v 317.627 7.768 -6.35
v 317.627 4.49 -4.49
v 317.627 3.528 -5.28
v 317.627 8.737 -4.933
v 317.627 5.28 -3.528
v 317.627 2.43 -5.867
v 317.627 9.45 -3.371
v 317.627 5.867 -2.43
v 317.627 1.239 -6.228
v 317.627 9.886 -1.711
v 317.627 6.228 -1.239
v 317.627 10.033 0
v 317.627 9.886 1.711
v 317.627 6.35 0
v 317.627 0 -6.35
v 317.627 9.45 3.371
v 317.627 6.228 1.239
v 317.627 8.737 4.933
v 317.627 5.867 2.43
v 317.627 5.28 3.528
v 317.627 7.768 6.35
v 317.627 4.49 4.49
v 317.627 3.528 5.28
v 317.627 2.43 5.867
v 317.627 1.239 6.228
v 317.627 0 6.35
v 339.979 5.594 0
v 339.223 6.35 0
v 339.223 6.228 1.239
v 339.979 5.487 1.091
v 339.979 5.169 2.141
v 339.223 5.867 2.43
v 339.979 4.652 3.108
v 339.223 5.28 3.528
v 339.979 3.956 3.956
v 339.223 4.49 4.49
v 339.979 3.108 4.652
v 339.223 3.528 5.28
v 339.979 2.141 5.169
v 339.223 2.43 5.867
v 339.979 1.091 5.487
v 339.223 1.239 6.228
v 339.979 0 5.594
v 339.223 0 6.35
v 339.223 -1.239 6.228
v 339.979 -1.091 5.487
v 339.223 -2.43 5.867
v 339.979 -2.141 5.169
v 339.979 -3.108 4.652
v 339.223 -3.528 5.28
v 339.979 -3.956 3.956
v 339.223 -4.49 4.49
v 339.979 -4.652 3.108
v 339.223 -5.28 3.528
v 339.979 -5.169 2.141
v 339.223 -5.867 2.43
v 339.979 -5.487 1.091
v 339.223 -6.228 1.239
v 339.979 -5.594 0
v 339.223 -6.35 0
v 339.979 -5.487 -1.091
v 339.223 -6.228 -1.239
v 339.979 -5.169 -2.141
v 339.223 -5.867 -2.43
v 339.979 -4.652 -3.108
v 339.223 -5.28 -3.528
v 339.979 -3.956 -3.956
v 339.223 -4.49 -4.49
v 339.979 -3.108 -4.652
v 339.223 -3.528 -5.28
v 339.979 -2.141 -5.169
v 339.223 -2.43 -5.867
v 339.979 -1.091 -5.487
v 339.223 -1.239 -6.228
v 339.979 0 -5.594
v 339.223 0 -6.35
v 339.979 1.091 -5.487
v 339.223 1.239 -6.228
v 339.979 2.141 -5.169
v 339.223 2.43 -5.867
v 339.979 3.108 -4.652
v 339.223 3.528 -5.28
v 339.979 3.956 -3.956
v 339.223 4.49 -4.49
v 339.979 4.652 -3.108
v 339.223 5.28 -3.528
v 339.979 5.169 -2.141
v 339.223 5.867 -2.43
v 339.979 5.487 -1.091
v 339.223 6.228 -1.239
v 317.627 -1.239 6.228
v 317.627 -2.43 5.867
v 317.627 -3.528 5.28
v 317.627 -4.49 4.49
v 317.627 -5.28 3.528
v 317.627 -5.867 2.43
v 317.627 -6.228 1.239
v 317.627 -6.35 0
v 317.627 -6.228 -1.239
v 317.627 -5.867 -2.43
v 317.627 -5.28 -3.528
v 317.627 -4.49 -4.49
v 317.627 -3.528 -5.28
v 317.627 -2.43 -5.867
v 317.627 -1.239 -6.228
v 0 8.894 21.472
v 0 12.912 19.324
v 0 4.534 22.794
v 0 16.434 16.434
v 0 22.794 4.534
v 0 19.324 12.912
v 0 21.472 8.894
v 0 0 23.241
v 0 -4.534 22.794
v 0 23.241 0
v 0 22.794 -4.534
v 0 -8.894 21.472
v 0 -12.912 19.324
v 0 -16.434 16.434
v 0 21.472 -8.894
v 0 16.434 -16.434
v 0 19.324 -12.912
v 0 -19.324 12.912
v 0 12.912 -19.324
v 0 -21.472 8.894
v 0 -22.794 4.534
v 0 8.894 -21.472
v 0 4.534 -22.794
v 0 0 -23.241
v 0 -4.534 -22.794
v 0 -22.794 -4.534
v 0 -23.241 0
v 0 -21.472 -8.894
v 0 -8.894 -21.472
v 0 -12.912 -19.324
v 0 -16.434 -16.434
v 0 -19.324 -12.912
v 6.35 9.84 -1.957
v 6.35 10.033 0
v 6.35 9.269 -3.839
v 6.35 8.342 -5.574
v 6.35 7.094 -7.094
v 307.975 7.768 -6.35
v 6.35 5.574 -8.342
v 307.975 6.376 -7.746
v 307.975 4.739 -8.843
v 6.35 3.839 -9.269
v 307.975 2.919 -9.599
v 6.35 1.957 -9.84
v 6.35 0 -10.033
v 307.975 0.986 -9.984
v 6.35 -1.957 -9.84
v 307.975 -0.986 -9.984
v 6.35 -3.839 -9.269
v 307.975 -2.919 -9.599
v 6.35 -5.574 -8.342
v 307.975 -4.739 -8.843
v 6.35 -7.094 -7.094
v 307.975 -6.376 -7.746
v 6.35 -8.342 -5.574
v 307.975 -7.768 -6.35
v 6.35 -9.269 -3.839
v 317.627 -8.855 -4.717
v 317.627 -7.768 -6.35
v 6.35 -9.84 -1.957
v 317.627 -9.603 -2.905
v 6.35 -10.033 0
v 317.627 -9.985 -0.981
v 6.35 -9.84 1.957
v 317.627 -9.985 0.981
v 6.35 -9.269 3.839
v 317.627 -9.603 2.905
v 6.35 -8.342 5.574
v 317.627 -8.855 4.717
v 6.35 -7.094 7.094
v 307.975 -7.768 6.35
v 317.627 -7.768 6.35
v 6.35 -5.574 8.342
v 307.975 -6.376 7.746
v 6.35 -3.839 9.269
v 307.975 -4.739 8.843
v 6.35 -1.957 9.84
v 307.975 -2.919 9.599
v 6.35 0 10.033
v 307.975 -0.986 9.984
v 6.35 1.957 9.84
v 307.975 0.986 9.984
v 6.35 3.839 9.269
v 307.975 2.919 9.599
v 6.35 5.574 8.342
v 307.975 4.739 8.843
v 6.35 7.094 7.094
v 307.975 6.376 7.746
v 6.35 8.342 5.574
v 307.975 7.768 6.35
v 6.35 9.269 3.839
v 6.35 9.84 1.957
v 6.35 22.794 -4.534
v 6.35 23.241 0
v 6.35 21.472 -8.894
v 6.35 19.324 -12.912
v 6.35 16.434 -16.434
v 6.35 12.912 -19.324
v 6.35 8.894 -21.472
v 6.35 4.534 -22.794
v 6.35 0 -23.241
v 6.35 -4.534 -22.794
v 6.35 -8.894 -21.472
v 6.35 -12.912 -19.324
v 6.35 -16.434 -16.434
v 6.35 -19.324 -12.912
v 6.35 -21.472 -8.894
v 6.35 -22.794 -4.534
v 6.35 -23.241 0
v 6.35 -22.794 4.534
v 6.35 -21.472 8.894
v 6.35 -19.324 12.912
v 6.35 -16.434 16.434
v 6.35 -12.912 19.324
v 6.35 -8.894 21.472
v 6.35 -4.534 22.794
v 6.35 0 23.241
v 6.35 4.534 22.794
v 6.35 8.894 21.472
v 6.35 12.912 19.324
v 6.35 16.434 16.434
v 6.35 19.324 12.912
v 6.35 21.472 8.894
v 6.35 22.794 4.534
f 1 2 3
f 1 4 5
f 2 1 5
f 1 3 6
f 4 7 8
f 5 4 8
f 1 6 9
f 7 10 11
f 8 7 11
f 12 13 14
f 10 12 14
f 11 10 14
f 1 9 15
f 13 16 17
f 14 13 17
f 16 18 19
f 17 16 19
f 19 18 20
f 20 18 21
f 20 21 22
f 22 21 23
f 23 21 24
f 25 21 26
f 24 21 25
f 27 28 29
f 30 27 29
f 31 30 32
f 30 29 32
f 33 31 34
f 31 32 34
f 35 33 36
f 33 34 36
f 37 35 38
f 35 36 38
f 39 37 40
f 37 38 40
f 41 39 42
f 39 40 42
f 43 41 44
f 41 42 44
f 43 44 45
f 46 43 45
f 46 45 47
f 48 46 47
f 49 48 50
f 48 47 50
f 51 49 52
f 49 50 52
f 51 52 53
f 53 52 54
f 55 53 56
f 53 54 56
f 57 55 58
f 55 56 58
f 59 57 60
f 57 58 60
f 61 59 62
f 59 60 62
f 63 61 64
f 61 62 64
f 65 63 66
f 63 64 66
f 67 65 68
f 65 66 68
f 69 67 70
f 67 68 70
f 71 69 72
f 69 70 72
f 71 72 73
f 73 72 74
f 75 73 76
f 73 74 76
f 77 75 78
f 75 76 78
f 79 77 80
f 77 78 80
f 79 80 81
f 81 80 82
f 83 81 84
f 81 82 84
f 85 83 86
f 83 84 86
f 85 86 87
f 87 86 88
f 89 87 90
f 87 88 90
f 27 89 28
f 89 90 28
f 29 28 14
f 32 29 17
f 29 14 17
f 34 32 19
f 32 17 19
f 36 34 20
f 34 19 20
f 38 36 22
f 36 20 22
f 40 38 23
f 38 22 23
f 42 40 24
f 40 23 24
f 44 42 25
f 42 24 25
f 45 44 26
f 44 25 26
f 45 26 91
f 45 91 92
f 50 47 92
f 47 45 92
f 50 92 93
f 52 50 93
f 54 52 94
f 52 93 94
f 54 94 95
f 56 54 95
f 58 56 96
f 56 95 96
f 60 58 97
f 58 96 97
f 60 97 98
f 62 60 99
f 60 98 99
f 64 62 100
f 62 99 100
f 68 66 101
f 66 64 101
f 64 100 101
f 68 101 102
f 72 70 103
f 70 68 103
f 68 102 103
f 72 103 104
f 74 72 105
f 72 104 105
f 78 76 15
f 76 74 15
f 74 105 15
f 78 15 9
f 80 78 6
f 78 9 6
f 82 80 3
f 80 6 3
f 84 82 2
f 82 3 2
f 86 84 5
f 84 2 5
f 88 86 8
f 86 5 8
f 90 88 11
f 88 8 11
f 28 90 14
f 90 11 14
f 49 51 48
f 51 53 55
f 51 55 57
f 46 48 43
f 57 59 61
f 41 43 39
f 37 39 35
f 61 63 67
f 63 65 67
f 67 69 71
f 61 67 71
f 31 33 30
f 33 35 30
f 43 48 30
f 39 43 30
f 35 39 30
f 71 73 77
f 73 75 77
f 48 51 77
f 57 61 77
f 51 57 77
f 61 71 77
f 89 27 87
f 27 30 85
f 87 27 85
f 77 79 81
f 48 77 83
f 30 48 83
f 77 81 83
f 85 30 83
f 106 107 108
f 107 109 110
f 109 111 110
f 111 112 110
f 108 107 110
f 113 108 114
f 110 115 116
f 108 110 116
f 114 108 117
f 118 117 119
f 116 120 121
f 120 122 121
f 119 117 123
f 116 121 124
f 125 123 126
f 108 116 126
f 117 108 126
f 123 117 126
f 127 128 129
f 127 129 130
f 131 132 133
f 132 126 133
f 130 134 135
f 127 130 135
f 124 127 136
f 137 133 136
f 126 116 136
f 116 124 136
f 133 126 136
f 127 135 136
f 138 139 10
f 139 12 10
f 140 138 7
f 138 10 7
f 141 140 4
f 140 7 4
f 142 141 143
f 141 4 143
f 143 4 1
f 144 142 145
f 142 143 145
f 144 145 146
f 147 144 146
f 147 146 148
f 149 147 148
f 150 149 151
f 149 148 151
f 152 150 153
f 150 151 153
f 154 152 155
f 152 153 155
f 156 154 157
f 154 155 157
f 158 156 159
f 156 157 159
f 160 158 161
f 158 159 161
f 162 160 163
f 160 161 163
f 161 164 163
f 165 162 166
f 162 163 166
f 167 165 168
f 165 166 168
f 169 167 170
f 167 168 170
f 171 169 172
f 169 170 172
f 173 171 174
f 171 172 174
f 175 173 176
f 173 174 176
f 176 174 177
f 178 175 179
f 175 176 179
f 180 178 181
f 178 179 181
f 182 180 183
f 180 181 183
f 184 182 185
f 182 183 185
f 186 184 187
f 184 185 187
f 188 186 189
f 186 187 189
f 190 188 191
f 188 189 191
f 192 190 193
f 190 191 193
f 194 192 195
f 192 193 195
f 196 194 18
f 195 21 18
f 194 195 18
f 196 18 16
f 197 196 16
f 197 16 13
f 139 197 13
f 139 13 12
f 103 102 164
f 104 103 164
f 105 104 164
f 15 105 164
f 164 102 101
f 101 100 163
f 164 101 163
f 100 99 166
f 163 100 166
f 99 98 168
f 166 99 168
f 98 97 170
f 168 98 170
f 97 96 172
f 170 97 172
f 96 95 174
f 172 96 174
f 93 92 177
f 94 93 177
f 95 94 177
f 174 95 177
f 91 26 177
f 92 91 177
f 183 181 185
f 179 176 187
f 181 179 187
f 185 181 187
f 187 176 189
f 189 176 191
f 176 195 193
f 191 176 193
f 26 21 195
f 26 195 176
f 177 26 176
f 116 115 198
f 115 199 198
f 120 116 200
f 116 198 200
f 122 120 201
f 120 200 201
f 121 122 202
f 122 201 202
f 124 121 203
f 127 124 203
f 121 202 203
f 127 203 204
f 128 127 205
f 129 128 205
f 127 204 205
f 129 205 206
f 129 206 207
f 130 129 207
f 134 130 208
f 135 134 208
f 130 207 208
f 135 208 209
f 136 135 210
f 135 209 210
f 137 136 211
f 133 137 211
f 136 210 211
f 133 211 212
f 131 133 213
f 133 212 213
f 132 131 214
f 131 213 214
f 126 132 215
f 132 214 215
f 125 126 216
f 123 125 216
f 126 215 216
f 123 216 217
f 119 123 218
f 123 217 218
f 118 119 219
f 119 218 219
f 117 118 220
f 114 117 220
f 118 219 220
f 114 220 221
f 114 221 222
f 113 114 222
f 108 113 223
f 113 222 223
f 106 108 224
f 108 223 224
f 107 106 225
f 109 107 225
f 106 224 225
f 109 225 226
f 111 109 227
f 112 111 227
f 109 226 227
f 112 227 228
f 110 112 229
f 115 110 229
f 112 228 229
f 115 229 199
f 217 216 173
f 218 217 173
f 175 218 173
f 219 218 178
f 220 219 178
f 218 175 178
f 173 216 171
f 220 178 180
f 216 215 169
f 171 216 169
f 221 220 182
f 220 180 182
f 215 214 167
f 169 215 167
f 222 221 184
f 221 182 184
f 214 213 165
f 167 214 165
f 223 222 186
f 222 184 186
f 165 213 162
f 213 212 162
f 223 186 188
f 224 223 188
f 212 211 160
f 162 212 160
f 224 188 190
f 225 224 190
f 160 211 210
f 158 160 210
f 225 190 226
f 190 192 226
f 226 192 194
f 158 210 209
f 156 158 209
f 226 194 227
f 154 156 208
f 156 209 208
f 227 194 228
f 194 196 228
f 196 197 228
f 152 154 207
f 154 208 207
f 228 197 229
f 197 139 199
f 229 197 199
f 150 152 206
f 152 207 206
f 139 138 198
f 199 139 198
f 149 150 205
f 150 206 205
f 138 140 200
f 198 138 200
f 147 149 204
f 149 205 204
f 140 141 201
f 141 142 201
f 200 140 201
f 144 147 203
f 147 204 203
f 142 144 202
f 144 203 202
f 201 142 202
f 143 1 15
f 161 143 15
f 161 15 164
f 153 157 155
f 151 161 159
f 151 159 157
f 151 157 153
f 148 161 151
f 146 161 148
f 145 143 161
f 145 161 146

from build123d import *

# Parameters (mm, degrees)
CUT_EXTRUDE1_DEPTH = 32.004


# Read off the part's stored shape, not the designer's step: 1/2-20 Machine Threads Stud1
with BuildPart() as part:
    # Sketch2 → Revolve1 (revolve)
    with BuildSketch(Plane.XY):
        Polygon((0, 0), (0, 23.241), (6.35, 23.241), (6.35, 10.033), (339.979, 10.033), (339.979, 0), align=None)
    revolve(axis=Axis((339.979, 0, 0), (-1, 0, 0)))

    # 1/2-20 Machine Threads Stud1 outline → 1/2-20 Machine Threads Stud1 (revolve, cut)
    with BuildSketch(Plane.YX):
        Polygon((10.033, 339.979), (5.59435, 339.979), (6.35, 339.22335), (6.35, 317.627), (10.033, 317.627), align=None)
    revolve(axis=Axis((0, 0, 0), (1, 0, 0)), mode=Mode.SUBTRACT)

    # Sketch7 → Cut-Extrude1 (cut)
    with BuildSketch(Plane(origin=(339.979, 0, 0), x_dir=(0, 0, -1), z_dir=(1, 0, 0))):
        with BuildLine():
            Line((-6.35, 7.767791771), (-6.35, -7.767791771))
            ThreePointArc((-6.35, -7.767791771), (-10.033, 0), (-6.35, 7.767791771))
        make_face()
        with BuildLine():
            Line((6.35, 7.767791771), (6.35, -7.767791771))
            ThreePointArc((6.35, -7.767791771), (10.033, 0), (6.35, 7.767791771))
        make_face()
    extrude(amount=-CUT_EXTRUDE1_DEPTH, mode=Mode.SUBTRACT)


solid = part.part
